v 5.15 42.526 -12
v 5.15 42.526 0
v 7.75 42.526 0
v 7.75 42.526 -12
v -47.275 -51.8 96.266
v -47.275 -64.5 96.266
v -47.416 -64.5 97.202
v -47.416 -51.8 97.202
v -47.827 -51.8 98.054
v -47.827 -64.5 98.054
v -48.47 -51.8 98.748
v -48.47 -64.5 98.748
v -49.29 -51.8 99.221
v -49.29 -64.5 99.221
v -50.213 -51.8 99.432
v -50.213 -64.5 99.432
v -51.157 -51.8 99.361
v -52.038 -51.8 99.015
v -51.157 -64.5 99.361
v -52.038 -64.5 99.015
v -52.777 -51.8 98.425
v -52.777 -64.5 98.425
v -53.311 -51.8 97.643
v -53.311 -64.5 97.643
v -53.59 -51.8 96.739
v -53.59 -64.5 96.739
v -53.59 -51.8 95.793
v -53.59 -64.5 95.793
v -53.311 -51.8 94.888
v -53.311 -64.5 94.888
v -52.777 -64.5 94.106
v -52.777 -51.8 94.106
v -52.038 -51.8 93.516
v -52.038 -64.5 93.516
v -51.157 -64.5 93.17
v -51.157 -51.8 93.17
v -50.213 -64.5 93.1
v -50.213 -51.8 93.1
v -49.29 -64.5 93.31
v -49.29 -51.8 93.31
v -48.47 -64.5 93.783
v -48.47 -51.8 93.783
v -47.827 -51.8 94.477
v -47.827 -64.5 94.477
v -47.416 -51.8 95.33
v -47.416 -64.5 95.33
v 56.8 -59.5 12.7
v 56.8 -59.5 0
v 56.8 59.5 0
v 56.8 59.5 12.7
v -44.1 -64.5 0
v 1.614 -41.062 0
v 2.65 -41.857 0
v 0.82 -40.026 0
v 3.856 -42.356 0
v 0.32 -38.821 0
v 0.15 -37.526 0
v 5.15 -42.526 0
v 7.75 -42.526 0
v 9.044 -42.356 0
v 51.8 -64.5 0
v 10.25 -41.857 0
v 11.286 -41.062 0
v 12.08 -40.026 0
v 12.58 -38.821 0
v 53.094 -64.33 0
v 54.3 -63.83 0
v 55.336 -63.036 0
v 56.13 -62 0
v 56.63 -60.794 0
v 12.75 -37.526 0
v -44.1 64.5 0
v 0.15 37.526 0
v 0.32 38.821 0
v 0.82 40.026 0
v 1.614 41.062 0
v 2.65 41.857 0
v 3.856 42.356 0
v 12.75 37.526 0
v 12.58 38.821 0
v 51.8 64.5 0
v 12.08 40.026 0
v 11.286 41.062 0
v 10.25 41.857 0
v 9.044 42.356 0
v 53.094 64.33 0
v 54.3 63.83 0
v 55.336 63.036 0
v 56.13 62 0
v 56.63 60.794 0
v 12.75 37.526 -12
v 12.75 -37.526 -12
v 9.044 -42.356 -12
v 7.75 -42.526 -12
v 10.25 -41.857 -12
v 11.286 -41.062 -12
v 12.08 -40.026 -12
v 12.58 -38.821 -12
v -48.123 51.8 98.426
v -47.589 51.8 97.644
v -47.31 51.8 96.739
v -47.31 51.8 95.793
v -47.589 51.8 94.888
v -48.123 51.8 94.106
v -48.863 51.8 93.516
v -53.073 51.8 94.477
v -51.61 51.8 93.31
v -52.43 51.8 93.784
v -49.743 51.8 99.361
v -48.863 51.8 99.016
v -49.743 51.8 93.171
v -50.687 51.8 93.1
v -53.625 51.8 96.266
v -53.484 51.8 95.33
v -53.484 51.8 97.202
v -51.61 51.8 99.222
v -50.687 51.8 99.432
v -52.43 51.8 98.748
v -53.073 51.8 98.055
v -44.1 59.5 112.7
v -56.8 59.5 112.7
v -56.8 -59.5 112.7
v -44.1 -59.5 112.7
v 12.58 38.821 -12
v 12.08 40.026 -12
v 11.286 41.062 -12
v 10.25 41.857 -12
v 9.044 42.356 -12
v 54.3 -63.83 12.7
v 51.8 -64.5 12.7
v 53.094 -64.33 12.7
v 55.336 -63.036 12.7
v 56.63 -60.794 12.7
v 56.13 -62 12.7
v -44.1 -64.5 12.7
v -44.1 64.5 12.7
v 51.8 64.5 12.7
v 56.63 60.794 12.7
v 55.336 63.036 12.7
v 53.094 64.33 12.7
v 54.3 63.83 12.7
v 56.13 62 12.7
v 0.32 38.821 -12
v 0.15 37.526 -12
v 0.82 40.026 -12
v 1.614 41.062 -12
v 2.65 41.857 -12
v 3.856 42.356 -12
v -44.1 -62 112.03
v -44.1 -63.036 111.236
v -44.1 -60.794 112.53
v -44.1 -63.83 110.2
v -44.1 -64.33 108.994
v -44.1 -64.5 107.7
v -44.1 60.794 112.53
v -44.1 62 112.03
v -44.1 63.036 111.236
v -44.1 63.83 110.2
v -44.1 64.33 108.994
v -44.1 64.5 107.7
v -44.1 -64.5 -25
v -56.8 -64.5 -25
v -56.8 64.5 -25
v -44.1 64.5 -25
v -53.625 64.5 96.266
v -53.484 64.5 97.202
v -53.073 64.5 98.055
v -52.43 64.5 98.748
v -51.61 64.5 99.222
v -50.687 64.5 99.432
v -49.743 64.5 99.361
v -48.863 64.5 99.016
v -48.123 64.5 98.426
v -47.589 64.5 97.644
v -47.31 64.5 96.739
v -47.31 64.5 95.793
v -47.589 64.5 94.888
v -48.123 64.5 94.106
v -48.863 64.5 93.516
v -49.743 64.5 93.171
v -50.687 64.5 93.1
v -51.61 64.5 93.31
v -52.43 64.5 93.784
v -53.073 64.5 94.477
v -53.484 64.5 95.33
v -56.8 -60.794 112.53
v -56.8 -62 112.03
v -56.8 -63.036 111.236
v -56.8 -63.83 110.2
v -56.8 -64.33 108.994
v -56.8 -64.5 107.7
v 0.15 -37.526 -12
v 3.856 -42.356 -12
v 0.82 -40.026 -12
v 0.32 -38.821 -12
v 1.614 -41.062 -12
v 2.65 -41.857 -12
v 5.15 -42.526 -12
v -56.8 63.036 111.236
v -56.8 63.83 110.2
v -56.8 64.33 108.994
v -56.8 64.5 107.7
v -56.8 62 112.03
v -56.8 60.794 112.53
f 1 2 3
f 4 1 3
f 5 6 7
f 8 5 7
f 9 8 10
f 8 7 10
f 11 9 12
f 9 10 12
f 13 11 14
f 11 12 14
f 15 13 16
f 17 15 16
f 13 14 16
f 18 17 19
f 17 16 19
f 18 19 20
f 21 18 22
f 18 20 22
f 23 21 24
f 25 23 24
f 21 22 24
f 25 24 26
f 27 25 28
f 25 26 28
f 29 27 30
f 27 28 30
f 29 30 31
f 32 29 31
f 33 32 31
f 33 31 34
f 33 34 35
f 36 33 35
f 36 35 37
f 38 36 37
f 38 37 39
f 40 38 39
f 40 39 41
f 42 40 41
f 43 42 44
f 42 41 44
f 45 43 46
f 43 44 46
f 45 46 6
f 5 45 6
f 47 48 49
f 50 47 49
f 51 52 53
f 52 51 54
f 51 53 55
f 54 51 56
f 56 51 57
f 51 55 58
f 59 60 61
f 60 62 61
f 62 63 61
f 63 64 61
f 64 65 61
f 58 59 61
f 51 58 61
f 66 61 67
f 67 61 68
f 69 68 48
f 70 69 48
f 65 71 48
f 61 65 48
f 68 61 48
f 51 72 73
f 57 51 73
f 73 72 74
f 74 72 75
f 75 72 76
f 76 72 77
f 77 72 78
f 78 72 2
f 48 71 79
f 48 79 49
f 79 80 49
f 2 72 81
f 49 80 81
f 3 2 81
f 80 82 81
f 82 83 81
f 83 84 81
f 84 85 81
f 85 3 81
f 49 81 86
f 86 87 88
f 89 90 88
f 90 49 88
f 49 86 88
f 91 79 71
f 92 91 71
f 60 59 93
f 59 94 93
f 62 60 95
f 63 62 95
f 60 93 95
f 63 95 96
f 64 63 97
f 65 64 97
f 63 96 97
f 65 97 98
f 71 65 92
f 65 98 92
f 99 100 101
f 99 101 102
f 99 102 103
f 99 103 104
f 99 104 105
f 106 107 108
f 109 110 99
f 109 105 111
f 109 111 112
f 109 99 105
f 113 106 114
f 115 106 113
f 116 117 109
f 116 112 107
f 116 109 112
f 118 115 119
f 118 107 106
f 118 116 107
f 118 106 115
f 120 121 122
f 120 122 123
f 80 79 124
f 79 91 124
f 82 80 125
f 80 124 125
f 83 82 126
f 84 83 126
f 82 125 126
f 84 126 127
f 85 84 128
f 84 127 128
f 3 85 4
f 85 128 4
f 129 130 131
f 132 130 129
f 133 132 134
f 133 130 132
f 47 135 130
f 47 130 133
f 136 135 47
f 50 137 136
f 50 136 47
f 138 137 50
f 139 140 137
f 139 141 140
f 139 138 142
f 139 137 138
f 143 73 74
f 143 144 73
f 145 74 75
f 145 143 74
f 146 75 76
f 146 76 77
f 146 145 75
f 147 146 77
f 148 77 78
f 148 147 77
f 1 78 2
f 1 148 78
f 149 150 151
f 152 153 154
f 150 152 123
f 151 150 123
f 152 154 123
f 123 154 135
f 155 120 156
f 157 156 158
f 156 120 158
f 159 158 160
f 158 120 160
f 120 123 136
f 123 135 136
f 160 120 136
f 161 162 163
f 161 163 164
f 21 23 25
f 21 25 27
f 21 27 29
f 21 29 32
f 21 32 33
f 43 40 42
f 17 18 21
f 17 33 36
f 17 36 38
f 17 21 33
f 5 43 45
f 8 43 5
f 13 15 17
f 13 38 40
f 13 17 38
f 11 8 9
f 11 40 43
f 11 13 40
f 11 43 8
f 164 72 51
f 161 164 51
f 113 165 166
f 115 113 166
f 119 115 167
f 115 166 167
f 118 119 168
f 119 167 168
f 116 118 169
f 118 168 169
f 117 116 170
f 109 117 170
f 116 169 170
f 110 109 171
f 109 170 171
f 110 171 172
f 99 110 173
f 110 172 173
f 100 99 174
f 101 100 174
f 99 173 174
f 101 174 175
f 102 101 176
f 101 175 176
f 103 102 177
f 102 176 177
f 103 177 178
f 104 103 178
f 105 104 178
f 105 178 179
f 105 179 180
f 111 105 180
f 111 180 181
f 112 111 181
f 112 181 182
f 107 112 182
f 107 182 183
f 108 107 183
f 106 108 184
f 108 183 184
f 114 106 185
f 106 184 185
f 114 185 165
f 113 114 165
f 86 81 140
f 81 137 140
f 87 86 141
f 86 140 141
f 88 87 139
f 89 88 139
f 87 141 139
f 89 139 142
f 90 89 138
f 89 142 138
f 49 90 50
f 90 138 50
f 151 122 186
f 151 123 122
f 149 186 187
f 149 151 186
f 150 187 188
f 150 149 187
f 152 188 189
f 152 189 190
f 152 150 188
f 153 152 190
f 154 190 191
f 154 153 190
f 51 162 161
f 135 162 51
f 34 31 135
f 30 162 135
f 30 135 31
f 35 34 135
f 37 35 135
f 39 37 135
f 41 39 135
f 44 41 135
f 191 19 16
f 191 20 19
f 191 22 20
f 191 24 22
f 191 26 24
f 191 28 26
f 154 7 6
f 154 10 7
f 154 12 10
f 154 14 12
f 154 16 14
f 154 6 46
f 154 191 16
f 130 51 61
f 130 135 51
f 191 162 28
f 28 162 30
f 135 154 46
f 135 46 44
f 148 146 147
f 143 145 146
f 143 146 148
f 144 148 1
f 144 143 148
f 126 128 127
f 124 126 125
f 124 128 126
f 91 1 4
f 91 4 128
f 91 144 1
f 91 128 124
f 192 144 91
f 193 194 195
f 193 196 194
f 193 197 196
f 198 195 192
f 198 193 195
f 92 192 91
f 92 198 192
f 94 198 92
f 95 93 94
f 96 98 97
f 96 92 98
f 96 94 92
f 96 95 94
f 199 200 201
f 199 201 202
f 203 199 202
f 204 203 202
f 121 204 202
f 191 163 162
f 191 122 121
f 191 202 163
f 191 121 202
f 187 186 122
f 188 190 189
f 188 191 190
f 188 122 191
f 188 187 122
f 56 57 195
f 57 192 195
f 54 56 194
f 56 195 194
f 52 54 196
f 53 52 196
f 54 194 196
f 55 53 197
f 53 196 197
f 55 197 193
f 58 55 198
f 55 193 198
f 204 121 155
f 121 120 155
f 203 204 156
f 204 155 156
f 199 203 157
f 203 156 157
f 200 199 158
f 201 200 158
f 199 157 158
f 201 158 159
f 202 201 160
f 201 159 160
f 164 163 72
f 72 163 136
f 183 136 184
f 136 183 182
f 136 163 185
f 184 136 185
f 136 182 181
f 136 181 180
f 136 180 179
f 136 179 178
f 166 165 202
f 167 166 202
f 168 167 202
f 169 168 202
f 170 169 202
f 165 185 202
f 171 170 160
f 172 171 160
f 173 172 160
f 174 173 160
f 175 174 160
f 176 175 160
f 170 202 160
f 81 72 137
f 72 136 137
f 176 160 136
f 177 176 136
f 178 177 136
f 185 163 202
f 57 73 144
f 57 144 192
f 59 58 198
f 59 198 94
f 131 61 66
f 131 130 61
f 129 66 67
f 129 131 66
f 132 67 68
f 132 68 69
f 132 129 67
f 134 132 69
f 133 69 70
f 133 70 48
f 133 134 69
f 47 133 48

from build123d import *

# Parameters (mm, degrees)
F0_W      = 113.6
F0_H      = 129
F1_DEPTH  = 12.7
F2_W      = 12.7
F2_H      = 129
F3_DEPTH  = 100
F4_R      = 3.175
F5_DEPTH  = 12.7
F6_R      = 5
F7_W      = 12.700058
F7_H      = 129
F8_DEPTH  = 25
F9_W      = 12.6
F9_H      = 85.052852
F10_DEPTH = 12
F11_R     = 5
F12_R     = 3.175
F13_DEPTH = 12.7


with BuildPart() as f1:
    # F0 (on Top) → F1 (new body)
    with BuildSketch(Plane.XY):
        Rectangle(F0_W, F0_H)
    extrude(amount=F1_DEPTH)

    # F2 (on face) → F3 (join)
    with BuildSketch(Plane.XY.offset(12.7)):
        with Locations((-50.45, 0)):
            Rectangle(F2_W, F2_H)
    extrude(amount=F3_DEPTH)

    # F4 (on face) → F5 (cut)
    with BuildSketch(Plane.XZ.offset(64.5)):
        with Locations((-50.45, 96.26574)):
            Circle(F4_R)
    extrude(amount=-F5_DEPTH, mode=Mode.SUBTRACT)

    # F6
    f6_edges = [f1.edges().sort_by_distance(p)[0] for p in [
        (-50.45, -64.5, 112.7),
        (-50.45, 64.5, 112.7),
        (56.8, -64.5, 6.35),
        (56.8, 64.5, 6.35),
    ]]
    fillet(f6_edges, radius=F6_R)

    # F7 (on face) → F8 (join)
    with BuildSketch(Plane(origin=(0, 0, 0), x_dir=(1, 0, 0), z_dir=(0, 0, -1))):
        with Locations((-50.449971, 0)):
            Rectangle(F7_W, F7_H)
    extrude(amount=F8_DEPTH)

    # F9 (on face) → F10 (join)
    with BuildSketch(Plane(origin=(0, 0, 0), x_dir=(1, 0, 0), z_dir=(0, 0, -1))):
        with Locations((6.45, 0)):
            Rectangle(F9_W, F9_H)
    extrude(amount=F10_DEPTH)

    # F11
    f11_edges = [f1.edges().sort_by_distance(p)[0] for p in [
        (0.15, -42.526426, -6),
        (12.75, -42.526426, -6),
        (0.15, 42.526426, -6),
        (12.75, 42.526426, -6),
    ]]
    fillet(f11_edges, radius=F11_R)

    # F12 (on face) → F13 (cut)
    with BuildSketch(Plane(origin=(0, 64.5, 0), x_dir=(-1, 0, 0), z_dir=(0, 1, 0))):
        with Locations((50.45, 96.266)):
            Circle(F12_R)
    extrude(amount=-F13_DEPTH, mode=Mode.SUBTRACT)


solid = f1.part
